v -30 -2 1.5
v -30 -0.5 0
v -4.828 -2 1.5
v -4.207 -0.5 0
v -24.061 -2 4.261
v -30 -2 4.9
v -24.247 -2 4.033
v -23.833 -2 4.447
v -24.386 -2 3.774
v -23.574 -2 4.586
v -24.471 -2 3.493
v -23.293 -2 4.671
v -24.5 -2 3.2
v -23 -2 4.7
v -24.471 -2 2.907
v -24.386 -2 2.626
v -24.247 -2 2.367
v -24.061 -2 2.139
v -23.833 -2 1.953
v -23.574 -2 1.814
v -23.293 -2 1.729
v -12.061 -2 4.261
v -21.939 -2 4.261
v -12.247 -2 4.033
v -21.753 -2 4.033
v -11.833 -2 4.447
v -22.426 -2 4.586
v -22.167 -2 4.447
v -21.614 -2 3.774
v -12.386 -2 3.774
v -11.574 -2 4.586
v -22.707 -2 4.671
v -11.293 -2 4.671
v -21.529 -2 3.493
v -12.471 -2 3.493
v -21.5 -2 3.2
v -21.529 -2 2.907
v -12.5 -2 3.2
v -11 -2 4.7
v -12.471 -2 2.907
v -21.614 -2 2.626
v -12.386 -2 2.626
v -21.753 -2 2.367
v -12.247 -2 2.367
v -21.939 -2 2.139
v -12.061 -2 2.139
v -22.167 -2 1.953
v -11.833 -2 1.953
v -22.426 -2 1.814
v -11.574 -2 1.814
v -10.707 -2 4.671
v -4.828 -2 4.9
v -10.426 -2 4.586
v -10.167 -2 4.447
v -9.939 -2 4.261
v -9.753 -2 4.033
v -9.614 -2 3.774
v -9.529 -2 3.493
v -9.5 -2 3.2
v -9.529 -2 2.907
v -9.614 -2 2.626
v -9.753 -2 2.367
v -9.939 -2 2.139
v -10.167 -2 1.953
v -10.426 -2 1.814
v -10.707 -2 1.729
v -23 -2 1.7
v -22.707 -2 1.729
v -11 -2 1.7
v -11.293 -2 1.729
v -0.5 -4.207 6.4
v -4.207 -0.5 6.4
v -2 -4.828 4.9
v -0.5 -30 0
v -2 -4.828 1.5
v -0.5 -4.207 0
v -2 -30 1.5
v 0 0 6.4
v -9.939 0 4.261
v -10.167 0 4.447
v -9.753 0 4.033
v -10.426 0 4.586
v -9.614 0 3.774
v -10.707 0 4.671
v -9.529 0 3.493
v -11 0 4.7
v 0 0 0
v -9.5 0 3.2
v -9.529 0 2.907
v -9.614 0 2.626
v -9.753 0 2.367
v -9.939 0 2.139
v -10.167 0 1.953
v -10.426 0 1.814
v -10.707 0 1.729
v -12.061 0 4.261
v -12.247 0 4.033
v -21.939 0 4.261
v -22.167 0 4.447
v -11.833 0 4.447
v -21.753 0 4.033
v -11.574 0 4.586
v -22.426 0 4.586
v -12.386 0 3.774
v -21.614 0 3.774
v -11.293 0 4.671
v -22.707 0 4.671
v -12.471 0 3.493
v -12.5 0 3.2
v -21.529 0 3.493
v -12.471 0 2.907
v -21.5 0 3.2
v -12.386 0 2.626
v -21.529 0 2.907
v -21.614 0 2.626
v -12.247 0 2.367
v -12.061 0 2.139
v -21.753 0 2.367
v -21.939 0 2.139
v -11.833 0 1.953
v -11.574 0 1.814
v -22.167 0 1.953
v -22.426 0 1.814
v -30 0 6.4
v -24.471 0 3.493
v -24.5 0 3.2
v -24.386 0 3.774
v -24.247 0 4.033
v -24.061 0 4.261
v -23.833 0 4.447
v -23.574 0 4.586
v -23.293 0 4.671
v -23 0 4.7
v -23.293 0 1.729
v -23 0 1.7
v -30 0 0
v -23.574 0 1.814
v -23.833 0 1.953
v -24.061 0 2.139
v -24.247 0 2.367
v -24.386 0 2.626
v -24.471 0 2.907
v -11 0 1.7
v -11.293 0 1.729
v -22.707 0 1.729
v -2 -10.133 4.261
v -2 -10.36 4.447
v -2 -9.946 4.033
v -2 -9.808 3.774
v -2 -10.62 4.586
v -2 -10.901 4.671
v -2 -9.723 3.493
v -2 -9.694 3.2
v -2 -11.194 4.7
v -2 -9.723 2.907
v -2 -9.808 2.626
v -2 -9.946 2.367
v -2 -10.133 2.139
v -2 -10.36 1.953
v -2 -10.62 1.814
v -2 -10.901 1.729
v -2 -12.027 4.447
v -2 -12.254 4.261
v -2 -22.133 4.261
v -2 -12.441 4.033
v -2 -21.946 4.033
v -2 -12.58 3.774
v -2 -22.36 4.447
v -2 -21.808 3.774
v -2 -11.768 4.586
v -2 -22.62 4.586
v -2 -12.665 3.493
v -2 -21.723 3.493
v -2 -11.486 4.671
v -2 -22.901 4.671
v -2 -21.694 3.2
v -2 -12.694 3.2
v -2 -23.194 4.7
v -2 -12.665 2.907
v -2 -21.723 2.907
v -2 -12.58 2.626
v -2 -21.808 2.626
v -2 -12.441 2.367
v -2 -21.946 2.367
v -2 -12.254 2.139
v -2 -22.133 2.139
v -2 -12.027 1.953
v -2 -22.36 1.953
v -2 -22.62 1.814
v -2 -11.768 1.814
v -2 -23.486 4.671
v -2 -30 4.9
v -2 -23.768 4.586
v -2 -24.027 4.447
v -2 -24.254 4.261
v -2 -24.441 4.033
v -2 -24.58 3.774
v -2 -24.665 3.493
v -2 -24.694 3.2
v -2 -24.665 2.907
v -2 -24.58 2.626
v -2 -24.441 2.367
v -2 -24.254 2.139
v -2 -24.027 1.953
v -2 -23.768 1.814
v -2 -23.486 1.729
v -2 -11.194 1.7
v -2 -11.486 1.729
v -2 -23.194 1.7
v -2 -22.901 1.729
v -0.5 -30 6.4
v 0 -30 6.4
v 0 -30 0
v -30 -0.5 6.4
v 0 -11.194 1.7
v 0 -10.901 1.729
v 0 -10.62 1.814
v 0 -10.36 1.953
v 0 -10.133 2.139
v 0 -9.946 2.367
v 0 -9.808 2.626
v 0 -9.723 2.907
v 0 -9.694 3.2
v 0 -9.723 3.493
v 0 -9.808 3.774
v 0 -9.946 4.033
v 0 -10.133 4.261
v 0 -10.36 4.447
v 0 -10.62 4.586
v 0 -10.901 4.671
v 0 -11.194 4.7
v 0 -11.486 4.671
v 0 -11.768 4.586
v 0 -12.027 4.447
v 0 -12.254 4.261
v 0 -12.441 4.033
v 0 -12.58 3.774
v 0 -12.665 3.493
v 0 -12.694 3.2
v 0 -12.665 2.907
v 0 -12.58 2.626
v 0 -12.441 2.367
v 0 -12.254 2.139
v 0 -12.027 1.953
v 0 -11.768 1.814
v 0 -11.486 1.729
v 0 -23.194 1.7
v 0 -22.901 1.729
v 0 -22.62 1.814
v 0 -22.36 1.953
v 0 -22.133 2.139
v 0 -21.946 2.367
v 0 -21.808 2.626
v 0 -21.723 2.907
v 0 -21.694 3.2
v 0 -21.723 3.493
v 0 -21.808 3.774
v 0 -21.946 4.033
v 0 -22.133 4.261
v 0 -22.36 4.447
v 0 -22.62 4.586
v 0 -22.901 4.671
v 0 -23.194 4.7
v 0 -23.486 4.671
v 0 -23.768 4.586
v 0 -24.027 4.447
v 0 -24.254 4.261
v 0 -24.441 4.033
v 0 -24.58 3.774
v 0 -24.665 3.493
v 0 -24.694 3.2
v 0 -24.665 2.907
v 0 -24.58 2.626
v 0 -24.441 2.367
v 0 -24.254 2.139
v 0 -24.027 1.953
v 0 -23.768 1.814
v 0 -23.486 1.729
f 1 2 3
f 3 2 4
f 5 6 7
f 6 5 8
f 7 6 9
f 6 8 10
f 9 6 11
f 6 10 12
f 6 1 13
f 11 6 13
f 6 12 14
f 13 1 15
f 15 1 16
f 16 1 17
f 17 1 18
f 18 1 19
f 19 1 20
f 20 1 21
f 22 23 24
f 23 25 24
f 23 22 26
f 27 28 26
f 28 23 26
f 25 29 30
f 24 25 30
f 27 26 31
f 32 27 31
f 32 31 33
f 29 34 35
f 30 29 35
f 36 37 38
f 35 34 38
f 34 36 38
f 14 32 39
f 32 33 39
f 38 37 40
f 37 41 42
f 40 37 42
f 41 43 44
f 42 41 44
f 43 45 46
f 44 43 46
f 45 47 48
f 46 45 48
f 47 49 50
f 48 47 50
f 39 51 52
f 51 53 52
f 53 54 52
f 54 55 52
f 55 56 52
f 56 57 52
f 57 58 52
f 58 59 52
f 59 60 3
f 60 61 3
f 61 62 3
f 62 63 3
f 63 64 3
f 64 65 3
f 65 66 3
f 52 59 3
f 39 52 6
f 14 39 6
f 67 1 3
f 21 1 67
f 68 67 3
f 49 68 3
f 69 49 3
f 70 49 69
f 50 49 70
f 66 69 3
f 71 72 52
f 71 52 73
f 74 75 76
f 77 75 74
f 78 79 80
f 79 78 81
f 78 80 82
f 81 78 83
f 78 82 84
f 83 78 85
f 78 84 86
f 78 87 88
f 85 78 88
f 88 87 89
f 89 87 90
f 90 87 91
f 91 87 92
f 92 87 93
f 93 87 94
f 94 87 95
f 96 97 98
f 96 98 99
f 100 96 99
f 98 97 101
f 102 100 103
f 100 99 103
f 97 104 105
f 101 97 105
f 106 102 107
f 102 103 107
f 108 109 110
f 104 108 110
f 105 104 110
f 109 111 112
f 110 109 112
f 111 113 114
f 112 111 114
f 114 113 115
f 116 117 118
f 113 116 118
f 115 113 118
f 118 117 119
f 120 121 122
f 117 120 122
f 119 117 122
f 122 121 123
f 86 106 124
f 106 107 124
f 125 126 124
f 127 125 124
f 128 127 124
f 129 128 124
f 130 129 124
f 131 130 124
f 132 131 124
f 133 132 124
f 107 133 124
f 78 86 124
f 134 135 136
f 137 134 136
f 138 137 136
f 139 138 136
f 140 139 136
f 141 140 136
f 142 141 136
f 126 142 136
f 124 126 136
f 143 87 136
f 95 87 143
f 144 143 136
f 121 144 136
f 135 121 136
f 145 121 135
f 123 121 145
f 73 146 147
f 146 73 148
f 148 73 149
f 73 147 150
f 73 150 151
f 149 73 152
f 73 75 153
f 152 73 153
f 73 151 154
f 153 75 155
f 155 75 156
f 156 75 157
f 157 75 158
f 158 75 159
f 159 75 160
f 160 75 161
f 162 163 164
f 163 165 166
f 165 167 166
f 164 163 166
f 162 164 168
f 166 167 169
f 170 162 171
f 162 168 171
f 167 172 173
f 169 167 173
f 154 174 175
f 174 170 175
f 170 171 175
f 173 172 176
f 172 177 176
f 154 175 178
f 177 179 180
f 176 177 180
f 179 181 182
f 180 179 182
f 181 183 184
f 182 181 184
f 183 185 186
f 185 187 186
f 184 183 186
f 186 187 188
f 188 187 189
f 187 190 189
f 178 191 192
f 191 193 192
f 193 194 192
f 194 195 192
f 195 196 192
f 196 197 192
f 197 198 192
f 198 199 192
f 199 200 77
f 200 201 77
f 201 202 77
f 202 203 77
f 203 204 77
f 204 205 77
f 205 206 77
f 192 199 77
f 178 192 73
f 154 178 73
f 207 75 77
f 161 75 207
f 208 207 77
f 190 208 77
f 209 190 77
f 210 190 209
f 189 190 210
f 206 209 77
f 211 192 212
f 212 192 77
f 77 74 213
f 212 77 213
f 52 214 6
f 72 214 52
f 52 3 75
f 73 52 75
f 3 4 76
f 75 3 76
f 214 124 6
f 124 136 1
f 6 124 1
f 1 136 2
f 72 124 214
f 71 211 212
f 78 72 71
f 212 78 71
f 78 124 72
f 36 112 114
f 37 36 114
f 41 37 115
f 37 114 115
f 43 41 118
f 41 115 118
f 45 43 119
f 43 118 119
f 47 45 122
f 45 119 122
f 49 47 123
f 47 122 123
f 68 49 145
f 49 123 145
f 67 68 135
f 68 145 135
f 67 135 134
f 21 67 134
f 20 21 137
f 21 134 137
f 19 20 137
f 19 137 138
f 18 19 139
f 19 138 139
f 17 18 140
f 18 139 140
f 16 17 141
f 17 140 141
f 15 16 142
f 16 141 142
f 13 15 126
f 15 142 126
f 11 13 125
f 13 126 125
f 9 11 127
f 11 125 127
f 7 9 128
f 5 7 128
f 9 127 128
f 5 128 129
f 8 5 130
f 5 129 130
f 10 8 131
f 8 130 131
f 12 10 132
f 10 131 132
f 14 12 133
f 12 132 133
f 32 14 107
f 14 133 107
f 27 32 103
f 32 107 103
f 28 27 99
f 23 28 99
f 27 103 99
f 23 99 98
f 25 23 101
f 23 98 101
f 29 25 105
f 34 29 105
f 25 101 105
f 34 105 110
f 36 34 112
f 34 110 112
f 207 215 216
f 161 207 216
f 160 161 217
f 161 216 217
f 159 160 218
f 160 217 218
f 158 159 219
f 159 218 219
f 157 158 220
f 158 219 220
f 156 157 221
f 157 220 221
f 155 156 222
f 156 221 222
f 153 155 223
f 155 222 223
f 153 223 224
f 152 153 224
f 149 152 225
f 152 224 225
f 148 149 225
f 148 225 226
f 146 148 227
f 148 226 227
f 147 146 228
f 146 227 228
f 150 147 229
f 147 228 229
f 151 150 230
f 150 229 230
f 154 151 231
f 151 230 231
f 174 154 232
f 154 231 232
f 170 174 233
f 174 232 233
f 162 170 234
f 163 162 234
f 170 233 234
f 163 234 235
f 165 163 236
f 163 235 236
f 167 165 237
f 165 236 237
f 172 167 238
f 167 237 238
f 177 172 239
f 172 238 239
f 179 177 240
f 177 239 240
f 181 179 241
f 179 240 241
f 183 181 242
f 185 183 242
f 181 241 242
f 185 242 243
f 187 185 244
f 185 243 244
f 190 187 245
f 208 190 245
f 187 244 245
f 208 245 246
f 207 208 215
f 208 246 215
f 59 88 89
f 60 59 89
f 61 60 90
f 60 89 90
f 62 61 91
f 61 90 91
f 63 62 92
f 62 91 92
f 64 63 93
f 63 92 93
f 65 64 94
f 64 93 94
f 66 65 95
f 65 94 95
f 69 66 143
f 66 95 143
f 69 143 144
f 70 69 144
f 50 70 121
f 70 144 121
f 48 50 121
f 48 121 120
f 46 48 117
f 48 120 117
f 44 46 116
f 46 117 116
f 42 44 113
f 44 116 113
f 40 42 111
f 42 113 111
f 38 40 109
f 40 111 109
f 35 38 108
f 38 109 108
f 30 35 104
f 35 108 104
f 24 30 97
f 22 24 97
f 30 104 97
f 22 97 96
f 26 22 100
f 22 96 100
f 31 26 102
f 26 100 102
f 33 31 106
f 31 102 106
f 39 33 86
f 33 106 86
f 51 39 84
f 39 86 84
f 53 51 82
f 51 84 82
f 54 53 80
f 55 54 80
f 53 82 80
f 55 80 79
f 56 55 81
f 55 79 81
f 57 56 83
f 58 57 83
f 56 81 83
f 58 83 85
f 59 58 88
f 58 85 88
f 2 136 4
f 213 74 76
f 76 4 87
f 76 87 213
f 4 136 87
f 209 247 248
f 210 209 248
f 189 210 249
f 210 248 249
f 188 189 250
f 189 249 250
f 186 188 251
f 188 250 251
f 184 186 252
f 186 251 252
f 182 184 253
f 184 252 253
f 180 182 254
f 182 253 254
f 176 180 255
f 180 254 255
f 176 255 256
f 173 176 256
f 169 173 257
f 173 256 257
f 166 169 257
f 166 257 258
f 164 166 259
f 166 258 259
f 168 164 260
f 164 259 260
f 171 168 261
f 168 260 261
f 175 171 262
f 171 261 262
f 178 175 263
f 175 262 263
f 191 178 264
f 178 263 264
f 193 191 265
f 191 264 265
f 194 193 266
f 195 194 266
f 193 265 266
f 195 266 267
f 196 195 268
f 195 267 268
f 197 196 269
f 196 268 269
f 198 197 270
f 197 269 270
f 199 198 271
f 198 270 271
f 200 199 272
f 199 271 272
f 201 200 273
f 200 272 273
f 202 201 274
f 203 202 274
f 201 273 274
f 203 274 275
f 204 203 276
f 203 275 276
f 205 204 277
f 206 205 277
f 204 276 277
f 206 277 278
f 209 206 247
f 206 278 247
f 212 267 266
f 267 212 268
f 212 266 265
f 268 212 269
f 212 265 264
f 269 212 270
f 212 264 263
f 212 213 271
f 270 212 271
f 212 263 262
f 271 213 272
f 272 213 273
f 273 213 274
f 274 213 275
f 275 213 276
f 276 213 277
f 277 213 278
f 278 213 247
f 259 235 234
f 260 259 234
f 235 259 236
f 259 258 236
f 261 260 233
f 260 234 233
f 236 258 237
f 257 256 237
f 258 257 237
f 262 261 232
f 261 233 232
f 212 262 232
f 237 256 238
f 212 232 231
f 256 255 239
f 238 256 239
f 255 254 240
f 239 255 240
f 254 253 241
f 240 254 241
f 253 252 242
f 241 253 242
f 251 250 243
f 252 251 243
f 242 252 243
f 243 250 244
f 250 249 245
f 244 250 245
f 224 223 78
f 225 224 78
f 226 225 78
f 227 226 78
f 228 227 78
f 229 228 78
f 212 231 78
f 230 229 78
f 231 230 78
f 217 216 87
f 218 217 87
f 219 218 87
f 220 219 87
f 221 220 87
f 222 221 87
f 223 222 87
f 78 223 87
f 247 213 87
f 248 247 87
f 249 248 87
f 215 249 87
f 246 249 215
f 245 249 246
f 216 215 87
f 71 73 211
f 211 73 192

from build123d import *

# Parameters (mm, degrees)
BOSS_EXTRUDE1_DEPTH = 6.4
SKETCH2_R           = 1.5
CUT_EXTRUDE1_DEPTH  = 2
SKETCH3_R           = 1.5
CUT_EXTRUDE2_DEPTH  = 2
CHAMFER9_SIZE       = 1.5
CHAMFER10_SIZE      = 1.5
CHAMFER11_SIZE      = 1.5


with BuildPart() as part:
    # Sketch1 → Boss-Extrude1 (new body)
    with BuildSketch(Plane.XY):
        Polygon((-4.828427125, -2), (-2, -4.828427125), (-2, -30), (0, -30), (0, -2), (0, 0), (-30, 0), (-30, -2), align=None)
    extrude(amount=BOSS_EXTRUDE1_DEPTH)

    # Sketch2 → Cut-Extrude1 (cut)
    with BuildSketch(Plane(origin=(0, 0, 0), x_dir=(1, 0, 0), z_dir=(0, 1, 0))):
        with Locations((-23, -3.2)):
            Circle(SKETCH2_R)
        with Locations((-11, -3.2)):
            Circle(SKETCH2_R)
    extrude(amount=-CUT_EXTRUDE1_DEPTH, mode=Mode.SUBTRACT)

    # Sketch3 → Cut-Extrude2 (cut)
    with BuildSketch(Plane(origin=(0, 0, 0), x_dir=(0, 0, -1), z_dir=(1, 0, 0))):
        with Locations((-3.2, -11.193683163)):
            Circle(SKETCH3_R)
        with Locations((-3.2, -23.193683163)):
            Circle(SKETCH3_R)
    extrude(amount=-CUT_EXTRUDE2_DEPTH, mode=Mode.SUBTRACT)

    # Chamfer9
    chamfer9_edges = [part.edges().sort_by_distance(p)[0] for p in [
        (-17.414213562, -2, 0),
    ]]
    chamfer(chamfer9_edges, length=CHAMFER9_SIZE)

    # Chamfer10
    chamfer10_edges = [part.edges().sort_by_distance(p)[0] for p in [
        (-2, -17.414213562, 0),
        (-3.414213562, -3.414213562, 0),
    ]]
    chamfer(chamfer10_edges, length=CHAMFER10_SIZE)

    # Chamfer11
    chamfer11_edges = [part.edges().sort_by_distance(p)[0] for p in [
        (-17.414213562, -2, 6.4),
        (-3.414213562, -3.414213562, 6.4),
        (-2, -17.414213562, 6.4),
    ]]
    chamfer(chamfer11_edges, length=CHAMFER11_SIZE)


solid = part.part
